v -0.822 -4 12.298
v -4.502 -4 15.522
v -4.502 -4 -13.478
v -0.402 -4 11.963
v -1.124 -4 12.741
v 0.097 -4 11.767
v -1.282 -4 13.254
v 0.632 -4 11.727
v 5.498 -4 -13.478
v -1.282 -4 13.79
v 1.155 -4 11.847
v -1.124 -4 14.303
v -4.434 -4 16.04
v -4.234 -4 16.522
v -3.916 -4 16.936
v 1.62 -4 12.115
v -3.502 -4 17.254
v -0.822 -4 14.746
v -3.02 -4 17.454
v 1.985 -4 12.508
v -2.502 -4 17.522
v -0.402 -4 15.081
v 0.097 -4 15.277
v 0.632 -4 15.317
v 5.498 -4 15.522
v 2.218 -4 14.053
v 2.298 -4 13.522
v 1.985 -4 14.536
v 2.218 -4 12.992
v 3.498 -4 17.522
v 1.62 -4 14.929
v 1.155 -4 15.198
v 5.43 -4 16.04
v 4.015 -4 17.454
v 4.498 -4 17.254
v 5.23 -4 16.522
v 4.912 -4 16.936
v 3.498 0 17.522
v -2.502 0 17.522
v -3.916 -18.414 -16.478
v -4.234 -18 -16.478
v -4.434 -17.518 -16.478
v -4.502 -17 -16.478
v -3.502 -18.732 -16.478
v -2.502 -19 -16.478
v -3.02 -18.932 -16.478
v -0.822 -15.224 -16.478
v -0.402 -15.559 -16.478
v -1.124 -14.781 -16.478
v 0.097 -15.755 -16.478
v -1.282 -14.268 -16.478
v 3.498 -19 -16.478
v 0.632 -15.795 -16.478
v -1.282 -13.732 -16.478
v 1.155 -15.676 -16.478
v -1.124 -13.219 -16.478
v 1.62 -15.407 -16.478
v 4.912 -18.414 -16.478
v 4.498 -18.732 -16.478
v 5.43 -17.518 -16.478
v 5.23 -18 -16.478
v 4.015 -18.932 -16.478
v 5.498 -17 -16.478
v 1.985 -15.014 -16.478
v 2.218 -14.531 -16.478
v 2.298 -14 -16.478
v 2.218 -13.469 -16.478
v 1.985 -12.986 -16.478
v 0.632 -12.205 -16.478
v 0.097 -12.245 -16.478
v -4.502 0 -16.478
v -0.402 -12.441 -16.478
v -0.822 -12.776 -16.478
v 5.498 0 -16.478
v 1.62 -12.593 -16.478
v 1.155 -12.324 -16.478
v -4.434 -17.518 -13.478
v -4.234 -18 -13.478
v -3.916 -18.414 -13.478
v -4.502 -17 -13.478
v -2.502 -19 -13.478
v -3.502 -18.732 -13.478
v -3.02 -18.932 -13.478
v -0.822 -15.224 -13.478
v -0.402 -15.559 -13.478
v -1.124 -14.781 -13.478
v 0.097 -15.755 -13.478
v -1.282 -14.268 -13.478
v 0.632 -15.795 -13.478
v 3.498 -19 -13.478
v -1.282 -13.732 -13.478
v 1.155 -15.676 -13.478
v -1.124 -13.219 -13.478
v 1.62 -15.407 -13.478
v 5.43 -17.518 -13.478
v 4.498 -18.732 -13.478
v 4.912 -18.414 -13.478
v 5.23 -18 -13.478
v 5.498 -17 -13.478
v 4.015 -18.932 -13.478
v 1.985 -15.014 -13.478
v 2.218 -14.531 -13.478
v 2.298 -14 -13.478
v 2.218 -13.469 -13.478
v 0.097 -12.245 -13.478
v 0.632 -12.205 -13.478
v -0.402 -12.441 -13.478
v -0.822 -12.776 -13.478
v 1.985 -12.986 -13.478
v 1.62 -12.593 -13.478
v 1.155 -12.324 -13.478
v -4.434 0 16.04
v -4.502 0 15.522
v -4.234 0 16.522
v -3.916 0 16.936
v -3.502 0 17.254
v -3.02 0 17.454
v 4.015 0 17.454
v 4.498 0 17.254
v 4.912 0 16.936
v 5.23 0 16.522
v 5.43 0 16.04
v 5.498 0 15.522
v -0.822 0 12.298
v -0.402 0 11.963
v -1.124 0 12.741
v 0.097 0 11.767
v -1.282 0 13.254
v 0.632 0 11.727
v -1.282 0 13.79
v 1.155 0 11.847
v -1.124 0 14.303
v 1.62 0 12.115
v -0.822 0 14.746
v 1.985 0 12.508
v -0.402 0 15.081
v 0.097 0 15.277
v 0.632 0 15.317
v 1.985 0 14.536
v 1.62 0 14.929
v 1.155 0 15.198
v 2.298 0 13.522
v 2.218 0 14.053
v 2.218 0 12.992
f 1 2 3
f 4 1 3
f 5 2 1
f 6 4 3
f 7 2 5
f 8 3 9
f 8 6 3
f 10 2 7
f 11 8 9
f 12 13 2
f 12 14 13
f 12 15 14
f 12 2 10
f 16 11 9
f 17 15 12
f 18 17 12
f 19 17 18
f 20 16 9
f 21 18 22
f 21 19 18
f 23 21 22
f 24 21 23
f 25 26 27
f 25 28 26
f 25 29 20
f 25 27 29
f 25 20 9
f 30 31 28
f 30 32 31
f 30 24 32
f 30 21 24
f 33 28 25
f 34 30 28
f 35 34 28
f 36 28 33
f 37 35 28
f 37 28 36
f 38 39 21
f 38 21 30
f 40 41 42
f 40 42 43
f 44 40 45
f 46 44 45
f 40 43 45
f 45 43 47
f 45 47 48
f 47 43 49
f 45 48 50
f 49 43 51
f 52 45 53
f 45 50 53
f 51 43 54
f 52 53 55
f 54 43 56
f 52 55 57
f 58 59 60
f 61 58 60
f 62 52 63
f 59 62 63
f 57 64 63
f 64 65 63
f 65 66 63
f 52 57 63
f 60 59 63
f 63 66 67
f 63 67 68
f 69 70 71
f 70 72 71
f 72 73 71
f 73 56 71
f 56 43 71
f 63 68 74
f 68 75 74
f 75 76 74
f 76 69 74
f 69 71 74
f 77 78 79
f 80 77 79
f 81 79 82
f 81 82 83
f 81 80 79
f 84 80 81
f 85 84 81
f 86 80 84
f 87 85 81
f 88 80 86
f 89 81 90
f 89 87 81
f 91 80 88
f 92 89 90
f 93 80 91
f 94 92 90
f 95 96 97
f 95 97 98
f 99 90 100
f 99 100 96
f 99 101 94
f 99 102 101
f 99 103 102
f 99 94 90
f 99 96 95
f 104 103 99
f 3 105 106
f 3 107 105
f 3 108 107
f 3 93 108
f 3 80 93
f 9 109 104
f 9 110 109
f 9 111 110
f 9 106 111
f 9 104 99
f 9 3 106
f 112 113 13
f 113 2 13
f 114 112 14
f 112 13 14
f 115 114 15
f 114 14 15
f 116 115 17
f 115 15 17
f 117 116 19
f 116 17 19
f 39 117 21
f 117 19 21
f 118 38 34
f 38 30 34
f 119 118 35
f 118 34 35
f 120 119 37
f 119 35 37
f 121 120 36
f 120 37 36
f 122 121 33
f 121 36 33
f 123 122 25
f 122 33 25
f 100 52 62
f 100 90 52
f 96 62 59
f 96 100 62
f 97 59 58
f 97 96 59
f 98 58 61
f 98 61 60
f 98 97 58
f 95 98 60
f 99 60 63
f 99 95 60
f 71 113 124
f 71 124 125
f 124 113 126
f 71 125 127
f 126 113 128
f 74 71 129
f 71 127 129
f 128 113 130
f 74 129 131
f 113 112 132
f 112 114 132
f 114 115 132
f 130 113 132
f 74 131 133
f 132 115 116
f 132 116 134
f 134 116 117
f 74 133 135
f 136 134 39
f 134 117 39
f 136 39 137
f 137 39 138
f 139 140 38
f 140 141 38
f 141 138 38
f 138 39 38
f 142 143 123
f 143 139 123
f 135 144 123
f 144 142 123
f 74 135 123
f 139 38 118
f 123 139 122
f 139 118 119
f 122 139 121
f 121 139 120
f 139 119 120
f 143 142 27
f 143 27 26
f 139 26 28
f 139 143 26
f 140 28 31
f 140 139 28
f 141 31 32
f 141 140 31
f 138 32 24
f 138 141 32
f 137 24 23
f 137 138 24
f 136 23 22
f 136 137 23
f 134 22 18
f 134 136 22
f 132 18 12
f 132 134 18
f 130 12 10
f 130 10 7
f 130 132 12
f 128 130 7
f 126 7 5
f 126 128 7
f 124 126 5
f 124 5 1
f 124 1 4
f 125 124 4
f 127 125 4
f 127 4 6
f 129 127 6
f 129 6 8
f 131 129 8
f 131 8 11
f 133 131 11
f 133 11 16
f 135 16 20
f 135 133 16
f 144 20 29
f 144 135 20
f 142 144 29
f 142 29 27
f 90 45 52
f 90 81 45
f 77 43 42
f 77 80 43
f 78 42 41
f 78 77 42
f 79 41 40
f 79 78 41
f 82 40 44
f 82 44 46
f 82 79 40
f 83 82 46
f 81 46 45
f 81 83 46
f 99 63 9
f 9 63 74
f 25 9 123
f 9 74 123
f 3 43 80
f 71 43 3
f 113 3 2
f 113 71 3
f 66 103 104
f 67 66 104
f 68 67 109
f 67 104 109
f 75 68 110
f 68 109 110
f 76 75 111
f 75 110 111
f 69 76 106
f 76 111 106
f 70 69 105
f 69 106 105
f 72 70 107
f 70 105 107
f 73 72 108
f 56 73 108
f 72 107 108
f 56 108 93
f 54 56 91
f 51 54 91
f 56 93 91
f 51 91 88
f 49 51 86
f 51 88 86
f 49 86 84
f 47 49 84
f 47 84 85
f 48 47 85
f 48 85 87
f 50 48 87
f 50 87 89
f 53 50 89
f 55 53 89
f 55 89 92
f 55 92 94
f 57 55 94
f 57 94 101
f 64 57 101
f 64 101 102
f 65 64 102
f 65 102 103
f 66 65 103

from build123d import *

# Parameters (mm, degrees)
F0_W     = 10
F0_H     = 31
F0_R     = 1.8
F1_DEPTH = 4
F0_H_2   = 3
F2_DEPTH = 19
F3_R     = 1.8
F4_DEPTH = 25
F5_R     = 2


with BuildPart() as f1:
    # F0 (on Front) → F1 (new body)
    with BuildSketch(Plane.XZ):
        with Locations((0.497756, 2.022149)):
            Rectangle(F0_W, F0_H)
        with Locations((0.497756, 13.522149)):
            Circle(F0_R, mode=Mode.SUBTRACT)
    extrude(amount=F1_DEPTH)

    # F0 (on Front) → F2 (join)
    with BuildSketch(Plane.XZ):
        with Locations((0.497756, -14.977851)):
            Rectangle(F0_W, F0_H_2)
    extrude(amount=F2_DEPTH)

    # F3 (on face) → F4 (cut)
    with BuildSketch(Plane.XY.offset(-13.477851)):
        with Locations((0.497756, -14)):
            Circle(F3_R)
    extrude(amount=-F4_DEPTH, mode=Mode.SUBTRACT)

    # F5
    f5_edges = [f1.edges().sort_by_distance(p)[0] for p in [
        (-4.502244, -2, 17.522149),
        (5.497756, -2, 17.522149),
        (5.497756, -19, -14.977851),
        (-4.502244, -19, -14.977851),
    ]]
    fillet(f5_edges, radius=F5_R)


solid = f1.part
